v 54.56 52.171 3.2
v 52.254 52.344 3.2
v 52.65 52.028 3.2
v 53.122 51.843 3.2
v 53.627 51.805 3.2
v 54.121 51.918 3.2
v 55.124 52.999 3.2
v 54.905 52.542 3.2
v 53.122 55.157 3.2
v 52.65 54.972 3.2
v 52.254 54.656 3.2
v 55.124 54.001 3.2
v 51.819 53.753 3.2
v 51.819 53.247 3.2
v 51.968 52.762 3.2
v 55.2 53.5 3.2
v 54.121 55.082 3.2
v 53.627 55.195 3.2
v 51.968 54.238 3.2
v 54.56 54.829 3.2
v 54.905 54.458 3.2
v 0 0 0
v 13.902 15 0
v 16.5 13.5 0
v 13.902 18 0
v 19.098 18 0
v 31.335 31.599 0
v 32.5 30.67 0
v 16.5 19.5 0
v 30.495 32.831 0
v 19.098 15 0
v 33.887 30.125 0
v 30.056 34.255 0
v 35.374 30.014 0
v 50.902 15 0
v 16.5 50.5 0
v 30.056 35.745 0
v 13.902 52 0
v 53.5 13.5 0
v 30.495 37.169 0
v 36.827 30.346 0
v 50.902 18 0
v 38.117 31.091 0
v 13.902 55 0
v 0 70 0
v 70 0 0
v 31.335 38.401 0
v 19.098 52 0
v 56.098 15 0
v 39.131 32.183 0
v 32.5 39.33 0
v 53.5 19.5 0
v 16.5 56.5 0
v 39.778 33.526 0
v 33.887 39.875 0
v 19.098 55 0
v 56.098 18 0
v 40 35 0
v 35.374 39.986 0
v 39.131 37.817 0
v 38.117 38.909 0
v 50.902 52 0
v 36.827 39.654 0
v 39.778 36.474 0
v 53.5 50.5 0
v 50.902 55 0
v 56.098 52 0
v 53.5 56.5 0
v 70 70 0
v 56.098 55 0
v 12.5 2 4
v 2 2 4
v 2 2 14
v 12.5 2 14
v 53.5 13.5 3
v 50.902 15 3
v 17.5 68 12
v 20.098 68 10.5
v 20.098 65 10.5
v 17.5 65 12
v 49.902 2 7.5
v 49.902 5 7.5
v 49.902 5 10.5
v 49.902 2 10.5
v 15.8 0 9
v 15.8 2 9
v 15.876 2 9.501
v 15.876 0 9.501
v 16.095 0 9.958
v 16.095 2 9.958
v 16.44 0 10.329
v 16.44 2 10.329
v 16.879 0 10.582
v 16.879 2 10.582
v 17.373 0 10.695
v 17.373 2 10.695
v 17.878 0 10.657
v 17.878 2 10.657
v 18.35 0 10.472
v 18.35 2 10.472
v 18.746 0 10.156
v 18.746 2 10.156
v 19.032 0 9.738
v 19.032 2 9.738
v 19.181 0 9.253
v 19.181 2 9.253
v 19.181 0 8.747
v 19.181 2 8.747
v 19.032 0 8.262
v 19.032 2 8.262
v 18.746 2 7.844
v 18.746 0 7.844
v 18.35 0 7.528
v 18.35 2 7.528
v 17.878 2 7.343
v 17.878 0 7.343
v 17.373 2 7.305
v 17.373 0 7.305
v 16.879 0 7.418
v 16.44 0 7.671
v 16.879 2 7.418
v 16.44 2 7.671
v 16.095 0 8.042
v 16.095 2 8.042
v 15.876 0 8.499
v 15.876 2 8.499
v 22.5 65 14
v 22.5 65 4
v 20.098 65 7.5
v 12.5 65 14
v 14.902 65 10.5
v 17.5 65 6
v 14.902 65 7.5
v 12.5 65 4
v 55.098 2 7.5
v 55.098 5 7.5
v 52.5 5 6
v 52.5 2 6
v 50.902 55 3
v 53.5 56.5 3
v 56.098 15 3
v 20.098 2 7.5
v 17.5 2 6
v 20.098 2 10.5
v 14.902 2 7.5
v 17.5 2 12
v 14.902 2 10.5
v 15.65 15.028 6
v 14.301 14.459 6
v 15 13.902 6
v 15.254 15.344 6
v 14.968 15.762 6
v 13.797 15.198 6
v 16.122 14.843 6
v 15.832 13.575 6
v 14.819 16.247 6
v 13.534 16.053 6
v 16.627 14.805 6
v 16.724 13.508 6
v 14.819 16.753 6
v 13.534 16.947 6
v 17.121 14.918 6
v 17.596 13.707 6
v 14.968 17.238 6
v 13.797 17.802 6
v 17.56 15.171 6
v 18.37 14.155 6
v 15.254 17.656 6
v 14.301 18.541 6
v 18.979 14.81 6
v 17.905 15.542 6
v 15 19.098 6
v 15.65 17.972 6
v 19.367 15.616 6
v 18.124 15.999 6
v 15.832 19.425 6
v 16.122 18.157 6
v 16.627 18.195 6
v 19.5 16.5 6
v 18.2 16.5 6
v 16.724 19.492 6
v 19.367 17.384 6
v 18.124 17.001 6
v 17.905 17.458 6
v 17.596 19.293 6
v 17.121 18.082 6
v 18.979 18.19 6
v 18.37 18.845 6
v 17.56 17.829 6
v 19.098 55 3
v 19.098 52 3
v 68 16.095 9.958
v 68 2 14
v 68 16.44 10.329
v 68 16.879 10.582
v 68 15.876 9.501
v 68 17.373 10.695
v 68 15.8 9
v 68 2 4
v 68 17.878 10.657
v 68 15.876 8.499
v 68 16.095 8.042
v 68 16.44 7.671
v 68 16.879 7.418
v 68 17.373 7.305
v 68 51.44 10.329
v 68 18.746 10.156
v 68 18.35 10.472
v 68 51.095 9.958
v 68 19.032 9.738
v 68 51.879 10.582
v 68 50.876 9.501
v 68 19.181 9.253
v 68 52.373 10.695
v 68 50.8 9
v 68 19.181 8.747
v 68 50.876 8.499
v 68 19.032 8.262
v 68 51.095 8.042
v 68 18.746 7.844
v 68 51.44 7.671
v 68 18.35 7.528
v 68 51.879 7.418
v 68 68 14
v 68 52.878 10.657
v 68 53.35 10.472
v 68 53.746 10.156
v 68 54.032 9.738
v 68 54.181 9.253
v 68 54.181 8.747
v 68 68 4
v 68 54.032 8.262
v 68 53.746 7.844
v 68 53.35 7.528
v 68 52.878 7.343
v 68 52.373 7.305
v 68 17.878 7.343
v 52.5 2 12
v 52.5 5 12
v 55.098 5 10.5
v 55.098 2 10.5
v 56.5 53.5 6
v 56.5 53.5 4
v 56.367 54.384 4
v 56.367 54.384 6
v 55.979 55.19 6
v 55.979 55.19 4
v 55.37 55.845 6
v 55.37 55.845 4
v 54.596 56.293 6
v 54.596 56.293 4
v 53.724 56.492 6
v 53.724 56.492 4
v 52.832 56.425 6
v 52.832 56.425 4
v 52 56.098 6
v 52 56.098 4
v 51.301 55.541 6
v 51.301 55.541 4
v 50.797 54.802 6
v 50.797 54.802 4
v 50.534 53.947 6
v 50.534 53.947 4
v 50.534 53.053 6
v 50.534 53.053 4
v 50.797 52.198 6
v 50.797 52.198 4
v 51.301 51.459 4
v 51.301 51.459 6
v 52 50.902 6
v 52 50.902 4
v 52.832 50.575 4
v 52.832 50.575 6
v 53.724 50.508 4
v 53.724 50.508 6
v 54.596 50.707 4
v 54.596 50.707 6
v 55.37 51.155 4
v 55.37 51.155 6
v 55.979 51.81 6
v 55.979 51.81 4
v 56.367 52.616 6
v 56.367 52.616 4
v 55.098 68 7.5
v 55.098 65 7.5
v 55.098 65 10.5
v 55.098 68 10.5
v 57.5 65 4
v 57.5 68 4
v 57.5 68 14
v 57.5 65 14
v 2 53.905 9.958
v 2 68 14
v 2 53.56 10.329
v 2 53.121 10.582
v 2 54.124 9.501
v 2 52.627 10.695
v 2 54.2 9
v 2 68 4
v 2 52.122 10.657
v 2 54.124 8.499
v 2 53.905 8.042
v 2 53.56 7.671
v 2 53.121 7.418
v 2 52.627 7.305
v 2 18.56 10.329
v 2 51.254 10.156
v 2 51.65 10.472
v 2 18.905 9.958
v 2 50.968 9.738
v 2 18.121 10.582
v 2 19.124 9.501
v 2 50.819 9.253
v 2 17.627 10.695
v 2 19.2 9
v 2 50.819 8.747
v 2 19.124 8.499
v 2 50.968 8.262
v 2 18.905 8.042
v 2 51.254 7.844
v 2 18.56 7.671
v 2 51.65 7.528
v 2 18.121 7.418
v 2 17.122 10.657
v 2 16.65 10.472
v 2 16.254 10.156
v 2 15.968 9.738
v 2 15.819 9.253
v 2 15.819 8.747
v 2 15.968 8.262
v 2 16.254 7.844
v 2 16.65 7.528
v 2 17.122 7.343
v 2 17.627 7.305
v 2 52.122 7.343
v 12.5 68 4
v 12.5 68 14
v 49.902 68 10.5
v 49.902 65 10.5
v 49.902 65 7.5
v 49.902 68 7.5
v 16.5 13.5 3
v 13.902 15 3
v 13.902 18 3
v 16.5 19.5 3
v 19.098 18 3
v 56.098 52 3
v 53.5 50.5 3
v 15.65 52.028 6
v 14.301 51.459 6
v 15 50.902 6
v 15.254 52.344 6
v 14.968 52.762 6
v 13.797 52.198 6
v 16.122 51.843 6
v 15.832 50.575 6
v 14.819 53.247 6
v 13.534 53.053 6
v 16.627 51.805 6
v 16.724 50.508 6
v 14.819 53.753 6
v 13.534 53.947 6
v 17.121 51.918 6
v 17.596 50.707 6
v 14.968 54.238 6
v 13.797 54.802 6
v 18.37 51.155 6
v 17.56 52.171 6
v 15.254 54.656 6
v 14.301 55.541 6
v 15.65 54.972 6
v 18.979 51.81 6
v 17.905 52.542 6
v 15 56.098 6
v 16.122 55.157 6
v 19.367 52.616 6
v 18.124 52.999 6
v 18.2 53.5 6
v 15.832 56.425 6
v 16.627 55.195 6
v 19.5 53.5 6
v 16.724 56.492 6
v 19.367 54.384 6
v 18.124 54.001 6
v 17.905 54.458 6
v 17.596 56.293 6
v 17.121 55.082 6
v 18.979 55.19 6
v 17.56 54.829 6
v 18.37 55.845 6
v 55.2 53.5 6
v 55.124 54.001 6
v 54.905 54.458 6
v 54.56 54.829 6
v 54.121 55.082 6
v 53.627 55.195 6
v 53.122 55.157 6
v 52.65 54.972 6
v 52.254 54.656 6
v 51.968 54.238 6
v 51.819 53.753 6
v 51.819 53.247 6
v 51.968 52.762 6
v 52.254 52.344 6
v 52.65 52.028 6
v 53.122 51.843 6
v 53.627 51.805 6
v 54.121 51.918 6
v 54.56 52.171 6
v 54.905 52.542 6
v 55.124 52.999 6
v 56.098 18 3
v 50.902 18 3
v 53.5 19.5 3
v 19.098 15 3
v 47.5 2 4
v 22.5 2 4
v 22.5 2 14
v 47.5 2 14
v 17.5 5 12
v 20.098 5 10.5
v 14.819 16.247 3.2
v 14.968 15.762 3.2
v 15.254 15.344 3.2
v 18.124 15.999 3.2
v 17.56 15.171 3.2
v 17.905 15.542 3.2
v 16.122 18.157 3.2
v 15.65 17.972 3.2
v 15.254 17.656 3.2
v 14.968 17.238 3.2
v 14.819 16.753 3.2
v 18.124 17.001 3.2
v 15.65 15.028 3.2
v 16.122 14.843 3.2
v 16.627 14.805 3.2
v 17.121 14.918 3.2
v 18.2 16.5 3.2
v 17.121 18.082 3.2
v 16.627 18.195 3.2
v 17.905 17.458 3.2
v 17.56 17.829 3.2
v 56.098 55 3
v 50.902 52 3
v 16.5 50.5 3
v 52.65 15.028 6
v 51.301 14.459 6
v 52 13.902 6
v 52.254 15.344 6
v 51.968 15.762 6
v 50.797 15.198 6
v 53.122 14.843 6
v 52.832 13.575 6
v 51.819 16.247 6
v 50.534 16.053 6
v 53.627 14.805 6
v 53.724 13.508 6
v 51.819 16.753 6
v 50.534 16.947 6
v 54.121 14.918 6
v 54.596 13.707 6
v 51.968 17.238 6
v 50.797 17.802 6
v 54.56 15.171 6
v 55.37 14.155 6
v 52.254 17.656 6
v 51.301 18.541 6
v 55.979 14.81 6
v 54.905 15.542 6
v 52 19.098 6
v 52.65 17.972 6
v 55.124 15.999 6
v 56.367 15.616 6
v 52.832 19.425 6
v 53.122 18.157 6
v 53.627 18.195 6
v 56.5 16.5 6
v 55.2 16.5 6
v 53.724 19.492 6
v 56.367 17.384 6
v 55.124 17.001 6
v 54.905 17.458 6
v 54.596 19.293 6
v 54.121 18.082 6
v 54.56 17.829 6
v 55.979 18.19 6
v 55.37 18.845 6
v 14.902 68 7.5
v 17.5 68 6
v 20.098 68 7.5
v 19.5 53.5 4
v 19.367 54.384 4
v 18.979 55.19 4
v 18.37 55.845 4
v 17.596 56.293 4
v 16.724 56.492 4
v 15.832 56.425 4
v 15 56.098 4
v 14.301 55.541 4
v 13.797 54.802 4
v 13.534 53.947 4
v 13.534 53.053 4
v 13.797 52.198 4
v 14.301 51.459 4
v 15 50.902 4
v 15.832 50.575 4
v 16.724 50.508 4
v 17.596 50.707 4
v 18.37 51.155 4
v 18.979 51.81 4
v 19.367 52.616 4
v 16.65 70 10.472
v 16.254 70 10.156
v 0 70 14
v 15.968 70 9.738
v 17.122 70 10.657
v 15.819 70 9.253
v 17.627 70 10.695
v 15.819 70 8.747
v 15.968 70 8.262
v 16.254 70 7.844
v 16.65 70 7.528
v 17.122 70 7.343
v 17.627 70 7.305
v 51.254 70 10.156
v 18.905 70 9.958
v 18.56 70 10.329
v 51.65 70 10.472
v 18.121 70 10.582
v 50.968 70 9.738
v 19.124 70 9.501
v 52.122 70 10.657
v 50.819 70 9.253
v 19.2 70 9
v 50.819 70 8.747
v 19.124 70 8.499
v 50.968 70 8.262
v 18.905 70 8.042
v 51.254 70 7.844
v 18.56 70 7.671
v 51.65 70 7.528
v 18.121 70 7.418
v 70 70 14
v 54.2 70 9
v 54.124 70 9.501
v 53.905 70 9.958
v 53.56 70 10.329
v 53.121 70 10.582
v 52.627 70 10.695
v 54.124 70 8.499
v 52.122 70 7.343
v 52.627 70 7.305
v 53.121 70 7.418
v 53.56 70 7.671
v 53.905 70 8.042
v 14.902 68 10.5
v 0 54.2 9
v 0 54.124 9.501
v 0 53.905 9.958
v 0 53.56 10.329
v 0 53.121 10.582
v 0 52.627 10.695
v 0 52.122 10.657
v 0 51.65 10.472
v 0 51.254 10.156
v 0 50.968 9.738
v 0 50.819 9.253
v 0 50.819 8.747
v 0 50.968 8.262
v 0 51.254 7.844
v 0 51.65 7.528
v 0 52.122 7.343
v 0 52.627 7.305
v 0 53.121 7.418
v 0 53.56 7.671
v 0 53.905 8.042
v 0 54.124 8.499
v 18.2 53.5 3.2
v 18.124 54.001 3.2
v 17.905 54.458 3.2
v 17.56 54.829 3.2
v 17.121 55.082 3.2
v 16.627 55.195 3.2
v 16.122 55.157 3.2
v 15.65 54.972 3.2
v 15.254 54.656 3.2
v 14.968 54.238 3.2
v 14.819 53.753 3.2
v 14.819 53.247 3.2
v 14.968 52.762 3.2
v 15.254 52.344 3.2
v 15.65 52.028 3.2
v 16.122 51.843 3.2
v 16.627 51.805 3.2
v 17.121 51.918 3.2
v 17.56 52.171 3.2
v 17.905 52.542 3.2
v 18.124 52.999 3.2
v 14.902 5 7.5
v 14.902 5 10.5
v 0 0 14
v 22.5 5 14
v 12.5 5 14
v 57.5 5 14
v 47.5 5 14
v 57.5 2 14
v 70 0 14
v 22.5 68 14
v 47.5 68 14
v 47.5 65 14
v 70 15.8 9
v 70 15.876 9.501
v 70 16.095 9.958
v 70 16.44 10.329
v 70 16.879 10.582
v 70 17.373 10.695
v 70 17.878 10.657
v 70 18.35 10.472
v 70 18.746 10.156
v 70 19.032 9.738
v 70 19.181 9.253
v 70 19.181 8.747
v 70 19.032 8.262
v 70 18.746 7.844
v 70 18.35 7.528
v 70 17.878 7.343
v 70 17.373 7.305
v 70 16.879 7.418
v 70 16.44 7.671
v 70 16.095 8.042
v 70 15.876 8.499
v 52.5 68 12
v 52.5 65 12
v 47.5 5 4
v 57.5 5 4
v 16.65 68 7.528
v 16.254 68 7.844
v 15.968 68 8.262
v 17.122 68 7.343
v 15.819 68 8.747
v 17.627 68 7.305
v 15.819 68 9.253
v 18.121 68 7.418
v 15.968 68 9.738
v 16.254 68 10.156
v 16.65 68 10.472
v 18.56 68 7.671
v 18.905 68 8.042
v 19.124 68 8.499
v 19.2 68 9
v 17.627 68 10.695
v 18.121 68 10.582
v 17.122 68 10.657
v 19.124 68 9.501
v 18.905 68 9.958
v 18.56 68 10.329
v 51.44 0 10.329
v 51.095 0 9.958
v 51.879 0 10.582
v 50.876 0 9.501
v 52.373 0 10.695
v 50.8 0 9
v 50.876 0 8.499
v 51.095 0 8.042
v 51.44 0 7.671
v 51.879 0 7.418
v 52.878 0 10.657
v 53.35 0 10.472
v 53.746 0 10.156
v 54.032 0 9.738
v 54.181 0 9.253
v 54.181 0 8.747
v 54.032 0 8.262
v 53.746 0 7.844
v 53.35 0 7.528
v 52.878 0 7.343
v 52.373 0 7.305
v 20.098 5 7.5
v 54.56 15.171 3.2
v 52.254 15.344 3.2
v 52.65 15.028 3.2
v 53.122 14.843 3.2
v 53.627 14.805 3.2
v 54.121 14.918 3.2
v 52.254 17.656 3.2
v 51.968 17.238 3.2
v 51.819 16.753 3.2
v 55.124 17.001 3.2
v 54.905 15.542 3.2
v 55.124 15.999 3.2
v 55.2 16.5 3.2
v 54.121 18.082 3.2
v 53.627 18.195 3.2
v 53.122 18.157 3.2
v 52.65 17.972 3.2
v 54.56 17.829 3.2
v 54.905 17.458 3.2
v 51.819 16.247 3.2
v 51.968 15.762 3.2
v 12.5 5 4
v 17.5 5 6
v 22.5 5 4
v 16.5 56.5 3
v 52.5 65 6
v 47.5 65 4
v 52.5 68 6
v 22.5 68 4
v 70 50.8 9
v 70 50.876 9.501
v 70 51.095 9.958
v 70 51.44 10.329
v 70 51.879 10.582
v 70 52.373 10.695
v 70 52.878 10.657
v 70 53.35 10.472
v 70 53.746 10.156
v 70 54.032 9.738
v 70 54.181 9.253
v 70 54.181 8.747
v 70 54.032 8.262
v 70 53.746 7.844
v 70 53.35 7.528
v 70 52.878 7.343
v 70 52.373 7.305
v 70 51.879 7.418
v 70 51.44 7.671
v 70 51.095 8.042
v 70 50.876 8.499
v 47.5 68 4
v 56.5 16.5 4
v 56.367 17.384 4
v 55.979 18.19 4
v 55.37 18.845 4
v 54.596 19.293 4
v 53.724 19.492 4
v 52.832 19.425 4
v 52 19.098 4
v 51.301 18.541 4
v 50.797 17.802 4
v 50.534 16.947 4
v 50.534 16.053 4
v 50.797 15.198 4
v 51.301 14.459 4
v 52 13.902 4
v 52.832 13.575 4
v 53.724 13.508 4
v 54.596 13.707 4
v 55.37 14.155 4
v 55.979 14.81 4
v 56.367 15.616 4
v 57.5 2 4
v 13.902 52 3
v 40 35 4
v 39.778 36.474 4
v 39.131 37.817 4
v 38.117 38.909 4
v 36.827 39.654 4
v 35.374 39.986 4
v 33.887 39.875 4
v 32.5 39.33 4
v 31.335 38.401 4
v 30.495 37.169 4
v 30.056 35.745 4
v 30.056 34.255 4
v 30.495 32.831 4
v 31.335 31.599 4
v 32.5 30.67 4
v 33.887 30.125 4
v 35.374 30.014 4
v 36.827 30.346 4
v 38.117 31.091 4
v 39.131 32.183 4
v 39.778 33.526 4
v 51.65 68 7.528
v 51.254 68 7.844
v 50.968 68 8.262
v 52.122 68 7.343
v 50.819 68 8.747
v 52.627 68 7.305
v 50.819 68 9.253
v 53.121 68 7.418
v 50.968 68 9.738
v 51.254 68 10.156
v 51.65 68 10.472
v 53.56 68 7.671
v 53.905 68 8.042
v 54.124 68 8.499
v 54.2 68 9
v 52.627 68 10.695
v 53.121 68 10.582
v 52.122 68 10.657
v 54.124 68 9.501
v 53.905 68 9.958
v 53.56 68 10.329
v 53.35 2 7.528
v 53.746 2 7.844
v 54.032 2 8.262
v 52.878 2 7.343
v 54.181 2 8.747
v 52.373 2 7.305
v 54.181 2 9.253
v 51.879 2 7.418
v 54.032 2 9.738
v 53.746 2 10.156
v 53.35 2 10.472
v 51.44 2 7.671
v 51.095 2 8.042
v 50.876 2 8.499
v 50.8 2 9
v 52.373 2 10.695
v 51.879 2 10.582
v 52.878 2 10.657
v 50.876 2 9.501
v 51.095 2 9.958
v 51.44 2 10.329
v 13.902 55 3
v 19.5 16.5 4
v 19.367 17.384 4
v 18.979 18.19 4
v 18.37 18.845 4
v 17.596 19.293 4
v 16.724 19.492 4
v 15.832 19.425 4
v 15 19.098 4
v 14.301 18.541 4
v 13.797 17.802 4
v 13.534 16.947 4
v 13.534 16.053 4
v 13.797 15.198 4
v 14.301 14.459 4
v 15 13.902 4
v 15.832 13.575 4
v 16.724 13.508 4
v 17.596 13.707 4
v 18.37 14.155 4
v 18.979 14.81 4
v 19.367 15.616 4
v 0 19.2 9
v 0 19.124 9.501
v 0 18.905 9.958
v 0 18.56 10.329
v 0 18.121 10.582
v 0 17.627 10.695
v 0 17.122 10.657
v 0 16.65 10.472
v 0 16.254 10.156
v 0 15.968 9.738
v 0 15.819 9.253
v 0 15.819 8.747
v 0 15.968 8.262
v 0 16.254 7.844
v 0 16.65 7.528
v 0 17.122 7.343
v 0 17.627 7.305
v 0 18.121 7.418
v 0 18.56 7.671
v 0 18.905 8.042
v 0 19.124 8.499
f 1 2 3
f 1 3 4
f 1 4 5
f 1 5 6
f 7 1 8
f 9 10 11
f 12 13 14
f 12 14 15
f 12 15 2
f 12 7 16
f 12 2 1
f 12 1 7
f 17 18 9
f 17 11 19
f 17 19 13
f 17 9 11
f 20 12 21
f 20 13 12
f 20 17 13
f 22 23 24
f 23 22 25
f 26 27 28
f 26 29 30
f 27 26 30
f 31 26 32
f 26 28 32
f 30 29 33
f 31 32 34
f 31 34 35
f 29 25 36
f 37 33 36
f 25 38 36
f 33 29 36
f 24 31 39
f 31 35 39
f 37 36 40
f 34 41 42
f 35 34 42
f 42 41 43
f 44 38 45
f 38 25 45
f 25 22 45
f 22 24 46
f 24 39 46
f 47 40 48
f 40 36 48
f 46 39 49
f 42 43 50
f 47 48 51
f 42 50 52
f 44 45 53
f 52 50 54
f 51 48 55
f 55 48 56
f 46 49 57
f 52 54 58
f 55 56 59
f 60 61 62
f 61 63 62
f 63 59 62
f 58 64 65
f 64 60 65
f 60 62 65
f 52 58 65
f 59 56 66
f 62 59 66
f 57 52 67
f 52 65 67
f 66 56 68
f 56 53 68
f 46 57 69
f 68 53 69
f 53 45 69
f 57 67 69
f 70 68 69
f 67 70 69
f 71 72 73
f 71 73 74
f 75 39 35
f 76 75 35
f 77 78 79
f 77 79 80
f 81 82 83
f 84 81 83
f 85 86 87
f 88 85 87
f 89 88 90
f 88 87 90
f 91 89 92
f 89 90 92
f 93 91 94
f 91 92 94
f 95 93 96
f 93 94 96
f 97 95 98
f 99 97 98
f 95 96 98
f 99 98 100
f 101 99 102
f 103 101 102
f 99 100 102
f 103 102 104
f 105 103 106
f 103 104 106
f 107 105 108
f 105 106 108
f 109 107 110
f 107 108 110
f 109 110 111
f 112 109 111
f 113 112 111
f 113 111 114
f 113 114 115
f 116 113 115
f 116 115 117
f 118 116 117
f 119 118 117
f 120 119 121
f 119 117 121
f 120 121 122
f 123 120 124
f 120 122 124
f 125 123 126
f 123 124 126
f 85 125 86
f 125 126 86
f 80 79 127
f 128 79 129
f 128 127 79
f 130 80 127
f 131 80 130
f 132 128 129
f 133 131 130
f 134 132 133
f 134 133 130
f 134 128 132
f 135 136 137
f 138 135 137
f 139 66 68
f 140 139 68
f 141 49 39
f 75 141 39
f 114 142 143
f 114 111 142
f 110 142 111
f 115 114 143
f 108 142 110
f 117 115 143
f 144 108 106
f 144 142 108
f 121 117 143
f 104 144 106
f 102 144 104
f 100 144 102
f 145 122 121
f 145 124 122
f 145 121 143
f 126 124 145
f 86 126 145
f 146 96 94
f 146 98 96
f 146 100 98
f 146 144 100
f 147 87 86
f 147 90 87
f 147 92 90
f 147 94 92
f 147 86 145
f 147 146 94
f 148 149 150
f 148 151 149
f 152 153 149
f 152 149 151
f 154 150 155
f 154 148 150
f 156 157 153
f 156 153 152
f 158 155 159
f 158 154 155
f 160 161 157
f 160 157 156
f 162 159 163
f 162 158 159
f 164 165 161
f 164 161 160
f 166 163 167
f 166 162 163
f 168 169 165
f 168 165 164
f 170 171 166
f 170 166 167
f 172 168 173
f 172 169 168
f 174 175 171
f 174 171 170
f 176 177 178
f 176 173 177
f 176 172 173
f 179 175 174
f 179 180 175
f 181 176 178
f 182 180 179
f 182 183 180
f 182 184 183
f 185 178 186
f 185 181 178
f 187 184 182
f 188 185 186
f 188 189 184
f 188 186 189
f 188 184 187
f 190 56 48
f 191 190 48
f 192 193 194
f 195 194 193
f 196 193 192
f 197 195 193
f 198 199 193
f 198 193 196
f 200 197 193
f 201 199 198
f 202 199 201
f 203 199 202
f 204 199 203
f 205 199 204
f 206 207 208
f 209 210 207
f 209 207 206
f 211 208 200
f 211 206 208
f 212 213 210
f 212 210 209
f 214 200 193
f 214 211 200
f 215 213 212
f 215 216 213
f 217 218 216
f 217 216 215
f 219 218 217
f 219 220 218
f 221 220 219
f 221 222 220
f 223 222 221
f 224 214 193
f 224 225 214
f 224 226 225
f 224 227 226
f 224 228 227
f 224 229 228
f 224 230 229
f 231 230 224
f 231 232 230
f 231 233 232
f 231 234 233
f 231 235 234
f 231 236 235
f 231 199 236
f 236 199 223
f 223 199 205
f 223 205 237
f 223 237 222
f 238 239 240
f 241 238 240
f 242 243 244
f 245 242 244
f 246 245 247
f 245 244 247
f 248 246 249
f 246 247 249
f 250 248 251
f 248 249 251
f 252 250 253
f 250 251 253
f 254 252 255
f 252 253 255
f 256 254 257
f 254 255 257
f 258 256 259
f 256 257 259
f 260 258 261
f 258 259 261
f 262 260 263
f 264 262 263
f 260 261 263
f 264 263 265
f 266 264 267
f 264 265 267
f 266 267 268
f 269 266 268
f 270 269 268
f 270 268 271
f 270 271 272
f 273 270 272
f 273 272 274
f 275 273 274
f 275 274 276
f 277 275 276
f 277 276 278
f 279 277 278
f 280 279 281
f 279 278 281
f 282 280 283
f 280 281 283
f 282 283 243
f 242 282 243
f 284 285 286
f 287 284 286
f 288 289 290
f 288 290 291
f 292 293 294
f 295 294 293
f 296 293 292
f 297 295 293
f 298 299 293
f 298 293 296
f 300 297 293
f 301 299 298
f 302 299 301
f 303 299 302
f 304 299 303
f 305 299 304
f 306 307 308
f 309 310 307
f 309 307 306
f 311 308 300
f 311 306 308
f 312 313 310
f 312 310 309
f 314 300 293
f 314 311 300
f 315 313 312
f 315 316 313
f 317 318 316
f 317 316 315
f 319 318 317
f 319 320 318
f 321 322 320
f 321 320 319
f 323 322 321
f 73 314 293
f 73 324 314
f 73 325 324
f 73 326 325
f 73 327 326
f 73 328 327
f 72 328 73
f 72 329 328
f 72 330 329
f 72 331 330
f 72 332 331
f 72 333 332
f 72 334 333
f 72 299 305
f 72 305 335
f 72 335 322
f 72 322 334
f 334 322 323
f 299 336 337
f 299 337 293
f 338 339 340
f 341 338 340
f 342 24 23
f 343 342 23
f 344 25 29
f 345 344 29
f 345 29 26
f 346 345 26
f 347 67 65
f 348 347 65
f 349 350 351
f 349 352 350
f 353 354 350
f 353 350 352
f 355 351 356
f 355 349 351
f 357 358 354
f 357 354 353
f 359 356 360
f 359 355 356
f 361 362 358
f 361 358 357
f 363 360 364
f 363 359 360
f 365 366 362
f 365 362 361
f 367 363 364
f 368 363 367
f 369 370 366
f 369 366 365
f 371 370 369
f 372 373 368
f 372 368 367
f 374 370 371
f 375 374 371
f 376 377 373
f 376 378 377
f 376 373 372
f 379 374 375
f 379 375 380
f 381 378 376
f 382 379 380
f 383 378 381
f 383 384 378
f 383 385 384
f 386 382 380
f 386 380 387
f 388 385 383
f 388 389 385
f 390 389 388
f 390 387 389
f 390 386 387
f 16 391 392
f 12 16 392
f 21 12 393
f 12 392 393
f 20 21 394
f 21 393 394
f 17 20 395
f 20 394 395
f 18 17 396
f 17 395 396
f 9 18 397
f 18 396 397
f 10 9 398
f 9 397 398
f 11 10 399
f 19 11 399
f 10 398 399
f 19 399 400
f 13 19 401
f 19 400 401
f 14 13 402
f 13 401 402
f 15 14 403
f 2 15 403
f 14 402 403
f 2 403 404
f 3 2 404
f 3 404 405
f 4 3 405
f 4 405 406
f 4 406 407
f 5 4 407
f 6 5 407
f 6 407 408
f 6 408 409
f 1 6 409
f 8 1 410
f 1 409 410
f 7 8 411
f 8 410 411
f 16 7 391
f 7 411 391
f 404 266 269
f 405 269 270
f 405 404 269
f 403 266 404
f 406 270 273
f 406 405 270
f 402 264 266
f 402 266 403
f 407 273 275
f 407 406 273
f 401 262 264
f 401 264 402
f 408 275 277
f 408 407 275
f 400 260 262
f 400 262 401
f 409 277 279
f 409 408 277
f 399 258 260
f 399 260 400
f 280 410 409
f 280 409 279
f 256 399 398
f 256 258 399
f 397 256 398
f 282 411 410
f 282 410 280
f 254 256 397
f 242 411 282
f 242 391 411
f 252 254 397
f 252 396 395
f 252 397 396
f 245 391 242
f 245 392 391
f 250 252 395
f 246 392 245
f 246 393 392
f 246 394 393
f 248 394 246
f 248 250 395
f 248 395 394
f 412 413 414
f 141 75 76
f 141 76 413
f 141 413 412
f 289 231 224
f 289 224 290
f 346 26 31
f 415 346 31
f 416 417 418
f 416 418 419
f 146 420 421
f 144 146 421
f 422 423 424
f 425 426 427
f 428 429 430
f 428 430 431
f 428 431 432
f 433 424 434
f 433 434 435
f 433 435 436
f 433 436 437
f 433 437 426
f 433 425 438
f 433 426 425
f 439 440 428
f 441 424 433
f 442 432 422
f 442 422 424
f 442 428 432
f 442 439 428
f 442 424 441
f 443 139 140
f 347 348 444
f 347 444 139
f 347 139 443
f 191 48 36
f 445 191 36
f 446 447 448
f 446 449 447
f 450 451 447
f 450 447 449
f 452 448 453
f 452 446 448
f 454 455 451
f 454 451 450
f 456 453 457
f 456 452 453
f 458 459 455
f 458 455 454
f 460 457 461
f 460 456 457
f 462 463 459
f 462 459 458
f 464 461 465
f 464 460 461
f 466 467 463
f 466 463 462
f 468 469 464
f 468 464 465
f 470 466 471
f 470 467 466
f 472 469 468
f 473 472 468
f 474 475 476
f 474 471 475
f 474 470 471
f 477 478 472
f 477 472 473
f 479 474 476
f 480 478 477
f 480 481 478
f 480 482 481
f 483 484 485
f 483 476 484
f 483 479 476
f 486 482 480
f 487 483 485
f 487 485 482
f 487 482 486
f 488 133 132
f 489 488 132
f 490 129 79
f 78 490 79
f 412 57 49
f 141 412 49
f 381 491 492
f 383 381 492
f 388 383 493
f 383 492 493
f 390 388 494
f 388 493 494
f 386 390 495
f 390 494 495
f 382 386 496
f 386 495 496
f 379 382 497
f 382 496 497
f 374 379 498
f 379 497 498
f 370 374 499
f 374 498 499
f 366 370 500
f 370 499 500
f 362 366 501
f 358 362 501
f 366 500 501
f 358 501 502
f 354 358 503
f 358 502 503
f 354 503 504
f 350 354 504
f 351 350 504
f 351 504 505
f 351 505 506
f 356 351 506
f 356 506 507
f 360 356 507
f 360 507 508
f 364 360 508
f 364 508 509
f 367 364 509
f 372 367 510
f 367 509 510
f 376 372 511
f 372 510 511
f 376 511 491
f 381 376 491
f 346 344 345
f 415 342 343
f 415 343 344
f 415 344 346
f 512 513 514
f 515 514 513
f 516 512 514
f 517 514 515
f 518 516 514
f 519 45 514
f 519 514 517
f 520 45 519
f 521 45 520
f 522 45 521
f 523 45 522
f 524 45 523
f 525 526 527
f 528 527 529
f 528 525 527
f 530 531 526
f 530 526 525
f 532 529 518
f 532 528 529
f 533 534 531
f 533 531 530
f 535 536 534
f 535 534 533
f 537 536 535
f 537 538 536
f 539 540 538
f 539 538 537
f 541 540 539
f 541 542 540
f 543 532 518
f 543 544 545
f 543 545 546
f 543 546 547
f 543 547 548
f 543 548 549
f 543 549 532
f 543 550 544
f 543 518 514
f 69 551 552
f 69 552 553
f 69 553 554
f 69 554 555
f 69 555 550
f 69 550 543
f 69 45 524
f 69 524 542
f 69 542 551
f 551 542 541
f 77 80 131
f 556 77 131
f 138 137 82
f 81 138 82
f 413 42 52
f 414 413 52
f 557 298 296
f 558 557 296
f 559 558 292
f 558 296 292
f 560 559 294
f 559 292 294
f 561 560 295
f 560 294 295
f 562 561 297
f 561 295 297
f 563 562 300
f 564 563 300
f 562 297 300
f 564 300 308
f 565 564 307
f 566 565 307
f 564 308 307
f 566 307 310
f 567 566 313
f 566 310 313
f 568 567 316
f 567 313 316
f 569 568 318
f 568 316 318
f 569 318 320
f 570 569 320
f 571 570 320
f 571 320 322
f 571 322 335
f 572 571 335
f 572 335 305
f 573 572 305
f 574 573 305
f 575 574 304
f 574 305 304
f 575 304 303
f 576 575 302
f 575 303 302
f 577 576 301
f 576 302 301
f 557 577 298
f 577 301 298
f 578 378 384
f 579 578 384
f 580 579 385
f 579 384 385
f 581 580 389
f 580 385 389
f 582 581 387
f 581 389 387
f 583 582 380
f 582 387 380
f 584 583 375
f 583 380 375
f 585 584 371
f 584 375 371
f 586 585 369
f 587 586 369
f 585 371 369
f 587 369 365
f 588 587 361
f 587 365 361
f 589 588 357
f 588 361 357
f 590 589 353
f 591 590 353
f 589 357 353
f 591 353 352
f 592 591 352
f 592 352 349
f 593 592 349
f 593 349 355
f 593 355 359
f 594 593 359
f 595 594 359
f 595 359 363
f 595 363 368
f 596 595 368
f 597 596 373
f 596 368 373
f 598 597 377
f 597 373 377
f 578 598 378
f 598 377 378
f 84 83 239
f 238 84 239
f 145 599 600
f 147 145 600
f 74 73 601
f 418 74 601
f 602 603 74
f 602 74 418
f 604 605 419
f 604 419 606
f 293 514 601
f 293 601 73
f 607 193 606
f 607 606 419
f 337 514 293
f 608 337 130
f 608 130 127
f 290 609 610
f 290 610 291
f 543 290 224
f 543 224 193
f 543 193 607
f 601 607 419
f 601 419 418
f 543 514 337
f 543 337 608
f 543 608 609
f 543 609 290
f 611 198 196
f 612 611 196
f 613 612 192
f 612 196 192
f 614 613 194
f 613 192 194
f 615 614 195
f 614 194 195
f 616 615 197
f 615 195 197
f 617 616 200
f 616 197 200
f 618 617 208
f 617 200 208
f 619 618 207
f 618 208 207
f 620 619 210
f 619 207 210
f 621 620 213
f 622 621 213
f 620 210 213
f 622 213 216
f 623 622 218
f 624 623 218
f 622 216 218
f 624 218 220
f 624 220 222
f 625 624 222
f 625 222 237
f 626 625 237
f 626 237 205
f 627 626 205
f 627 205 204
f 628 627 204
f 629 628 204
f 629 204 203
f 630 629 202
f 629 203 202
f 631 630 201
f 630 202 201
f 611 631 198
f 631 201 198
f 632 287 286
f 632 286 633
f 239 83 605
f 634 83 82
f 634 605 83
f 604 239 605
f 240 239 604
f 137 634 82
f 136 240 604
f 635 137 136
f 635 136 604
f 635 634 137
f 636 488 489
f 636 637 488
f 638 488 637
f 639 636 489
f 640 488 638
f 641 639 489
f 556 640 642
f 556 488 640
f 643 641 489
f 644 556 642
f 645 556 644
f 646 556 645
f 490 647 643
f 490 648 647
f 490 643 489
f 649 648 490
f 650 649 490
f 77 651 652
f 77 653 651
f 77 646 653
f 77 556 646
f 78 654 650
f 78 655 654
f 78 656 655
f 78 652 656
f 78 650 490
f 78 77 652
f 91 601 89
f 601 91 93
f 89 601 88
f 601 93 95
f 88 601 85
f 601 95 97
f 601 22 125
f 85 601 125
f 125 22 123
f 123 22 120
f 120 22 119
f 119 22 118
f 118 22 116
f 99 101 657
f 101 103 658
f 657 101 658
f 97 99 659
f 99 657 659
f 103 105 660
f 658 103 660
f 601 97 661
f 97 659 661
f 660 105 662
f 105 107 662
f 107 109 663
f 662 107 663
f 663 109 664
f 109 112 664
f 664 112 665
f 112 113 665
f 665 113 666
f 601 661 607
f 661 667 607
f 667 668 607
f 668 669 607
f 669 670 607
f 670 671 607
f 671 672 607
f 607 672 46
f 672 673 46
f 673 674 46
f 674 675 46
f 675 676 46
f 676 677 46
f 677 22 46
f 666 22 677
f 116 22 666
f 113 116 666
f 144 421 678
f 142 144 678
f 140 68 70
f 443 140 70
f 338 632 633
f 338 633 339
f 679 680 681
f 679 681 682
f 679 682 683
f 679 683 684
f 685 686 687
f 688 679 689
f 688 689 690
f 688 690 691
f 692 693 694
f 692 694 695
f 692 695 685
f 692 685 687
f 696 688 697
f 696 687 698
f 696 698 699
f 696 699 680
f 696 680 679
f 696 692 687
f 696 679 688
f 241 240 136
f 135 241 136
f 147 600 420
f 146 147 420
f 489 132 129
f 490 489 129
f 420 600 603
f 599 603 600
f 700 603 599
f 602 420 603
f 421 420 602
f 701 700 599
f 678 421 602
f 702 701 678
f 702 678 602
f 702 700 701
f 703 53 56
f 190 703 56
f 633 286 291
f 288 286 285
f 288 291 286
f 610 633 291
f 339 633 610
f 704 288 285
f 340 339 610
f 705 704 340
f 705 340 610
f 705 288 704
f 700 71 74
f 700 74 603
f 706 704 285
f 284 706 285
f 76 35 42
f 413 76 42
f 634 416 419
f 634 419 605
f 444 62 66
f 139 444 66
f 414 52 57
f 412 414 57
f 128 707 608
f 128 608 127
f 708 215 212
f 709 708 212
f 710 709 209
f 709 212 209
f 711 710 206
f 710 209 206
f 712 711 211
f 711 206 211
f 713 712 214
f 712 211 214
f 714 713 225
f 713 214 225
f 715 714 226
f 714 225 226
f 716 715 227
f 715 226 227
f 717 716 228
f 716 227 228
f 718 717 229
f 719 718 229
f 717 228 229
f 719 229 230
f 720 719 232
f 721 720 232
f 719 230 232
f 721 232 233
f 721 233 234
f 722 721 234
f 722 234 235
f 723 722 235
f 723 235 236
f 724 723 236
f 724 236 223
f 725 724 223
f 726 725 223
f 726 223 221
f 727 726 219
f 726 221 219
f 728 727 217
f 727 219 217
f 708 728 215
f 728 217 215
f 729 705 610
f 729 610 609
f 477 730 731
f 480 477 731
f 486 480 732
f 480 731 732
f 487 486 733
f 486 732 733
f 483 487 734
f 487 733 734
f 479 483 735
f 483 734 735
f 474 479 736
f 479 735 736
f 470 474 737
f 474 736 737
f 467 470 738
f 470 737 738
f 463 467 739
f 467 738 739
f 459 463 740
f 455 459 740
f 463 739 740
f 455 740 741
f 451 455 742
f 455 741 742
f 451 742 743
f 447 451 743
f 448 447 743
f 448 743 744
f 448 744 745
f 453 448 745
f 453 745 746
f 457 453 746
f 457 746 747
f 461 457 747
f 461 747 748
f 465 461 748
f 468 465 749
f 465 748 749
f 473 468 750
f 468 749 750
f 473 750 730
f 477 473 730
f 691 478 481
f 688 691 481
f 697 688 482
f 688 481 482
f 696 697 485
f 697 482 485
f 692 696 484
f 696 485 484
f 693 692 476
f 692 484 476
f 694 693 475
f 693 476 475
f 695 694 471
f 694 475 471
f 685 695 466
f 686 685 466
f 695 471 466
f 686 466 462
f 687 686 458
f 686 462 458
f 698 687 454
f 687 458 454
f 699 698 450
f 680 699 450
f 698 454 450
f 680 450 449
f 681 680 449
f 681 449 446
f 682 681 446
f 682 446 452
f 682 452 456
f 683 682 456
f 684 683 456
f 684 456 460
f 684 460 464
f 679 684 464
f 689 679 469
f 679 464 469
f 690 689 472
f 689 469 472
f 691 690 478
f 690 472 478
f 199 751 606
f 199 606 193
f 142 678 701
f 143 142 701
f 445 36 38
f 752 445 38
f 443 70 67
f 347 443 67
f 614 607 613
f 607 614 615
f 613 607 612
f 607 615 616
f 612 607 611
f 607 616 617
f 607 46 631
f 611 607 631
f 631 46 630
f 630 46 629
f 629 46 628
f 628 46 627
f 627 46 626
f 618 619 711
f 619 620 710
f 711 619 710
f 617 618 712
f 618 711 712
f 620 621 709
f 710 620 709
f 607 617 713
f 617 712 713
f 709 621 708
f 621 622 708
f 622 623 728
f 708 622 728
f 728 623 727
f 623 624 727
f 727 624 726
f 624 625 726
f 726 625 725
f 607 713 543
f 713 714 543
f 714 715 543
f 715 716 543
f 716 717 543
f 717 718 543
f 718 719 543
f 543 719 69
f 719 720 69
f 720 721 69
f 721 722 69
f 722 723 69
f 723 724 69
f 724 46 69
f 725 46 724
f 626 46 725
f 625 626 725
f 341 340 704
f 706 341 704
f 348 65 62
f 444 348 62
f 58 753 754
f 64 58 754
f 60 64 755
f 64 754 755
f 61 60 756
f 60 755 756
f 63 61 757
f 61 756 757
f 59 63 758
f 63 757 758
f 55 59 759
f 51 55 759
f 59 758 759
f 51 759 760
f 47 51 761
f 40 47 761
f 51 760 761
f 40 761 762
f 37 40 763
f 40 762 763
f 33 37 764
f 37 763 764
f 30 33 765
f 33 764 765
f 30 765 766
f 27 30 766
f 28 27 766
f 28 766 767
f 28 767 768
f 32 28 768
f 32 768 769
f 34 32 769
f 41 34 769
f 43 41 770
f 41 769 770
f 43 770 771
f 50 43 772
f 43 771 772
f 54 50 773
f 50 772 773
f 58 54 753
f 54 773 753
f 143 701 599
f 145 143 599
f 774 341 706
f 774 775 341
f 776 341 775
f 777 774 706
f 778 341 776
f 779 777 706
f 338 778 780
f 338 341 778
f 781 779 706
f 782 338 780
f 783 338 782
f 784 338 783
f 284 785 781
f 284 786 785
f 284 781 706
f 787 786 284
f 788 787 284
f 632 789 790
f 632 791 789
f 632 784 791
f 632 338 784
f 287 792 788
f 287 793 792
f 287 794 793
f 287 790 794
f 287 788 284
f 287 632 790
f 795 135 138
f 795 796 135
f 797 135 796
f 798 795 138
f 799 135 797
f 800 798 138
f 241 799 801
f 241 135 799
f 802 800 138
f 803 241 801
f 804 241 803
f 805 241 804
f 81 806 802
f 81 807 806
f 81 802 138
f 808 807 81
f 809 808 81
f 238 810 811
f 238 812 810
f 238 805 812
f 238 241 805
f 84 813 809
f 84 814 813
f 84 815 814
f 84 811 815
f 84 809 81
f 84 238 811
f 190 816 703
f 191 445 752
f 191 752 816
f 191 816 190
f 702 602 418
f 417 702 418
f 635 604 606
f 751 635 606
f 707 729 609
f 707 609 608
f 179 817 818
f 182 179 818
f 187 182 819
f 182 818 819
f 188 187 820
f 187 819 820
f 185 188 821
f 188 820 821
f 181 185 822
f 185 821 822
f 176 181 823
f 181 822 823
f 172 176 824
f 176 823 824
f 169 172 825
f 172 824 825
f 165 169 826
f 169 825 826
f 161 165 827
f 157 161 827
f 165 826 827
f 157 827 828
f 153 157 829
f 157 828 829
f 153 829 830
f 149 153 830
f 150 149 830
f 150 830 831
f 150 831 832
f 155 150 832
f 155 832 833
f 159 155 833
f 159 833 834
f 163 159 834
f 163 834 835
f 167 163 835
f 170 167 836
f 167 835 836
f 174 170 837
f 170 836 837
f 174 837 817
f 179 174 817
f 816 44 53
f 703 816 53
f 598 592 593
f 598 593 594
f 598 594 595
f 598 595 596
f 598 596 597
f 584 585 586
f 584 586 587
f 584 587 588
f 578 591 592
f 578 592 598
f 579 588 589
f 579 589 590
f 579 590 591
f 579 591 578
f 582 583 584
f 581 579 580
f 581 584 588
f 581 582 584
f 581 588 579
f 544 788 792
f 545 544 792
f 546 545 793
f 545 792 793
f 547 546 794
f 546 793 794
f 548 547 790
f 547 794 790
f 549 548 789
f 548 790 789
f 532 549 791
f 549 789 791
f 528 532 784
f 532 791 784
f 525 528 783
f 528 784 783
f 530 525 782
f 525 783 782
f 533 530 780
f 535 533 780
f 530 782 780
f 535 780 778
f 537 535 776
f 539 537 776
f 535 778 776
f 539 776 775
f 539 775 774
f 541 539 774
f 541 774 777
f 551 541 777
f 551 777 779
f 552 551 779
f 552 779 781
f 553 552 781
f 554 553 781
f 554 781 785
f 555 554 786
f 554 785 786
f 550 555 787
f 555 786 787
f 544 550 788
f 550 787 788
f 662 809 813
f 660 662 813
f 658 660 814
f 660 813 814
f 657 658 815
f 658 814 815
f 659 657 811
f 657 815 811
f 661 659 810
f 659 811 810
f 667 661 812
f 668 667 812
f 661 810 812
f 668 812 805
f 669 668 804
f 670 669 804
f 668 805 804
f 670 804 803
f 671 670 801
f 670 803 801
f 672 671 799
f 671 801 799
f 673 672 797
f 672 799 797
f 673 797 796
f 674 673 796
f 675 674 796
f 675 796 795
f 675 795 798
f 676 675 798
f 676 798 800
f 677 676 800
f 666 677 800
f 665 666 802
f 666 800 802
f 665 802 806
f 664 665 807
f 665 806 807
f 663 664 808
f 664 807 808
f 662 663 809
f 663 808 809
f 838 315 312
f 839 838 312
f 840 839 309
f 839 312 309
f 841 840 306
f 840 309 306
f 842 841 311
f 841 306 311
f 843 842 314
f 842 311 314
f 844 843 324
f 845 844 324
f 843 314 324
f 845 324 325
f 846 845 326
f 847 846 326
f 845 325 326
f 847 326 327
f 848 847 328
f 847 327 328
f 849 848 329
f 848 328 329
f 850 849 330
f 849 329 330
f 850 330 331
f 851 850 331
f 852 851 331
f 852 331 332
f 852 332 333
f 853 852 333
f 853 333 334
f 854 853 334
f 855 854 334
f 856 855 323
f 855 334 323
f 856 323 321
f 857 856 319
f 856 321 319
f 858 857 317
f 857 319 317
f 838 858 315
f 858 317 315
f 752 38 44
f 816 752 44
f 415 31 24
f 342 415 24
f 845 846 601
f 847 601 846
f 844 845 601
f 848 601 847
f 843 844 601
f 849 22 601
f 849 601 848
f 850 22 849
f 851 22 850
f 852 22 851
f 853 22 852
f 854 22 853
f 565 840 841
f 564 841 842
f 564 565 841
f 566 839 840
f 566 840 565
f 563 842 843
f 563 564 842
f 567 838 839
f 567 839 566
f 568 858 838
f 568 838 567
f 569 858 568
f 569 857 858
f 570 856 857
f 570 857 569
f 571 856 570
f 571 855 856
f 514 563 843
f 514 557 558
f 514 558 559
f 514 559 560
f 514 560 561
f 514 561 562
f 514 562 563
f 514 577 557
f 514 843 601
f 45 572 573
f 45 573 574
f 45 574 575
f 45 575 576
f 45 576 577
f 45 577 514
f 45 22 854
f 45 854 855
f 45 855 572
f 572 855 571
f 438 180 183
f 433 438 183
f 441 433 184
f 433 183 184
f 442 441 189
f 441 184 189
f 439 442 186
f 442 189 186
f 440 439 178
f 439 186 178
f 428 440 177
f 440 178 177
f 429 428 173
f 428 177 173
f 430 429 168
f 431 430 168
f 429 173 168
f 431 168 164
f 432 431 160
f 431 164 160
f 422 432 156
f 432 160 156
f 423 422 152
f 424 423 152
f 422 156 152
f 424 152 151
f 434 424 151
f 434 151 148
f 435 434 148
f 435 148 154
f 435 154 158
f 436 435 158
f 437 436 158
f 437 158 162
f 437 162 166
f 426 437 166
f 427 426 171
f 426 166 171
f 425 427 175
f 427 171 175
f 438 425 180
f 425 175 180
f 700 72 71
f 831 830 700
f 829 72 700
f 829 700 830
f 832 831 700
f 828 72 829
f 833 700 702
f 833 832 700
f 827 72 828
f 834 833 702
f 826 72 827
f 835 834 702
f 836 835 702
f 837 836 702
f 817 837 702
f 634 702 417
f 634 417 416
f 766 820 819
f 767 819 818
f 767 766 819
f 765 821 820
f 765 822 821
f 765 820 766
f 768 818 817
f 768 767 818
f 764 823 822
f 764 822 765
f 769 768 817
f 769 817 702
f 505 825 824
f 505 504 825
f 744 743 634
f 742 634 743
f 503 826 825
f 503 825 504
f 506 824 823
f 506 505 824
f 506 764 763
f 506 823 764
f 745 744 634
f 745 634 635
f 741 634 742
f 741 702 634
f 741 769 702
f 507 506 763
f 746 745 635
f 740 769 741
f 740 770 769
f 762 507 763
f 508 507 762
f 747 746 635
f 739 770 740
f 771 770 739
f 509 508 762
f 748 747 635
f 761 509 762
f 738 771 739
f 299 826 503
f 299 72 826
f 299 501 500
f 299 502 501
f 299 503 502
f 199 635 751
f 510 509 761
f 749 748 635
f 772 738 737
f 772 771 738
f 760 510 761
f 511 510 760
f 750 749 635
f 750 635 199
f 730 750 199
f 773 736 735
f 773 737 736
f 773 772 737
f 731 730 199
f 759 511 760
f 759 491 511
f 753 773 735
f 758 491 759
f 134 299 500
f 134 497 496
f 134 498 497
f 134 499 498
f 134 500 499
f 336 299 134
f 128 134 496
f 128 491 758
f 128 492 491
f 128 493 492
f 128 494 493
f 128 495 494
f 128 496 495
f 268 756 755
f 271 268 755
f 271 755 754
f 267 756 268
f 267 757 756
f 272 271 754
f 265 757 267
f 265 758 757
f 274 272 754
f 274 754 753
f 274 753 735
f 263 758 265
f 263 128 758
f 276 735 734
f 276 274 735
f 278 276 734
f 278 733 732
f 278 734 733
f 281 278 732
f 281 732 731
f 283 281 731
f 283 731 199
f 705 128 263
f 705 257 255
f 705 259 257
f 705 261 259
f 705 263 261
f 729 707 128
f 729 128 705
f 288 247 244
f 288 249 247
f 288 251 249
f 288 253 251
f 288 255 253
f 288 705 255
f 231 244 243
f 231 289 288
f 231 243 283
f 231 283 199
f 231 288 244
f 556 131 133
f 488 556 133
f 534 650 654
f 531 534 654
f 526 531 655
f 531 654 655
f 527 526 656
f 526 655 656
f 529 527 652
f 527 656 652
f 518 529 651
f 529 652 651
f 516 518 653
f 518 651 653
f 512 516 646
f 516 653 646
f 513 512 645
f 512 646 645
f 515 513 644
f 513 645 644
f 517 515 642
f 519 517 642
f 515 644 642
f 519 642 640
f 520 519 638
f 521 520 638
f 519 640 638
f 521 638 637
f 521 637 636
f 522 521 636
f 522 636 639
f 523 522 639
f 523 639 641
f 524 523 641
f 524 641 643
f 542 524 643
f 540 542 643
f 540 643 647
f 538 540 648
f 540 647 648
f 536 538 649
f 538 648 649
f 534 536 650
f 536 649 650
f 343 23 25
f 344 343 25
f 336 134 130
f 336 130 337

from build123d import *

# Parameters (mm, degrees)
SKETCH_W        = 70
SKETCH_H        = 70
PAD_DEPTH       = 4
SKETCH001_W     = 70
SKETCH001_H     = 70
PAD001_DEPTH    = 10
SKETCH002_R     = 1.7
POCKET_DEPTH    = 2
SKETCH003_R     = 1.7
POCKET001_DEPTH = 2
POCKET002_DEPTH = 3
SKETCH005_R     = 1.7
POCKET003_DEPTH = 2
POCKET004_DEPTH = 3
SKETCH007_R     = 1.7
POCKET005_DEPTH = 2
POCKET006_DEPTH = 3
SKETCH009_R     = 3
PAD002_DEPTH    = 2
SKETCH010_R     = 1.7
POCKET007_DEPTH = 2.8
SKETCH011_R     = 5
POCKET008_DEPTH = 4


with BuildPart() as part:
    # Sketch → Pad (new body)
    with BuildSketch(Plane.XY):
        with Locations((35, 35)):
            Rectangle(SKETCH_W, SKETCH_H)
    extrude(amount=PAD_DEPTH)

    # Sketch001 → Pad001 (new body)
    with BuildSketch(Plane.XY.offset(4)):
        with Locations((35, 35)):
            Rectangle(SKETCH001_W, SKETCH001_H)
        Polygon((2, 68), (2, 2), (12.5, 2), (12.5, 5), (22.5, 5), (22.5, 2), (47.5, 2), (47.5, 5), (57.5, 5), (57.5, 2), (68, 2), (68, 68), (57.5, 68), (57.5, 65), (47.5, 65), (47.5, 68), (22.5, 68), (22.5, 65), (12.5, 65), (12.5, 68), align=None, mode=Mode.SUBTRACT)
    extrude(amount=PAD001_DEPTH)

    # Sketch002 → Pocket (cut)
    with BuildSketch(Plane.YZ.offset(2)):
        with Locations((17.5, 9)):
            Circle(SKETCH002_R)
        with Locations((52.5, 9)):
            Circle(SKETCH002_R)
    extrude(amount=-POCKET_DEPTH, mode=Mode.SUBTRACT)

    # Sketch003 → Pocket001 (cut)
    with BuildSketch(Plane(origin=(68, 0, 0), x_dir=(0, -1, 0), z_dir=(-1, 0, 0))):
        with Locations((-52.5, 9)):
            Circle(SKETCH003_R)
        with Locations((-17.5, 9)):
            Circle(SKETCH003_R)
    extrude(amount=-POCKET001_DEPTH, mode=Mode.SUBTRACT)

    # Sketch004 → Pocket002 (cut)
    with BuildSketch(Plane(origin=(0, 5, 0), x_dir=(-1, 0, 0), z_dir=(0, 1, 0))):
        Polygon((-49.901924, 10.5), (-52.5, 12), (-55.098076, 10.5), (-55.098076, 7.5), (-52.5, 6), (-49.901924, 7.5), align=None)
        Polygon((-14.901924, 10.5), (-17.5, 12), (-20.098076, 10.5), (-20.098076, 7.5), (-17.5, 6), (-14.901924, 7.5), align=None)
    extrude(amount=-POCKET002_DEPTH, mode=Mode.SUBTRACT)

    # Sketch005 → Pocket003 (cut)
    with BuildSketch(Plane(origin=(0, 2, 0), x_dir=(-1, 0, 0), z_dir=(0, 1, 0))):
        with Locations((-52.5, 9)):
            Circle(SKETCH005_R)
        with Locations((-17.5, 9)):
            Circle(SKETCH005_R)
    extrude(amount=-POCKET003_DEPTH, mode=Mode.SUBTRACT)

    # Sketch006 → Pocket004 (cut)
    with BuildSketch(Plane.XZ.offset(-65)):
        Polygon((20.098076, 10.5), (17.5, 12), (14.901924, 10.5), (14.901924, 7.5), (17.5, 6), (20.098076, 7.5), align=None)
        Polygon((55.098076, 10.5), (52.5, 12), (49.901924, 10.5), (49.901924, 7.5), (52.5, 6), (55.098076, 7.5), align=None)
    extrude(amount=-POCKET004_DEPTH, mode=Mode.SUBTRACT)

    # Sketch007 → Pocket005 (cut)
    with BuildSketch(Plane.XZ.offset(-68)):
        with Locations((17.5, 9)):
            Circle(SKETCH007_R)
        with Locations((52.5, 9)):
            Circle(SKETCH007_R)
    extrude(amount=-POCKET005_DEPTH, mode=Mode.SUBTRACT)

    # Sketch008 → Pocket006 (cut)
    with BuildSketch(Plane(origin=(0, 0, 0), x_dir=(1, 0, 0), z_dir=(0, 0, -1))):
        Polygon((19.098076, -15), (16.5, -13.5), (13.901924, -15), (13.901924, -18), (16.5, -19.5), (19.098076, -18), align=None)
        Polygon((56.098076, -15), (53.5, -13.5), (50.901924, -15), (50.901924, -18), (53.5, -19.5), (56.098076, -18), align=None)
        Polygon((56.098076, -55), (56.098076, -52), (53.5, -50.5), (50.901924, -52), (50.901924, -55), (53.5, -56.5), align=None)
        Polygon((19.098076, -52), (16.5, -50.5), (13.901924, -52), (13.901924, -55), (16.5, -56.5), (19.098076, -55), align=None)
    extrude(amount=-POCKET006_DEPTH, mode=Mode.SUBTRACT)

    # Sketch009 → Pad002 (new body)
    with BuildSketch(Plane.XY.offset(4)):
        with Locations((16.5, 53.5)):
            Circle(SKETCH009_R)
        with Locations((53.5, 53.5)):
            Circle(SKETCH009_R)
        with Locations((53.5, 16.5)):
            Circle(SKETCH009_R)
        with Locations((16.5, 16.5)):
            Circle(SKETCH009_R)
    extrude(amount=PAD002_DEPTH)

    # Sketch010 → Pocket007 (cut)
    with BuildSketch(Plane.XY.offset(6)):
        with Locations((16.5, 53.5)):
            Circle(SKETCH010_R)
        with Locations((53.5, 53.5)):
            Circle(SKETCH010_R)
        with Locations((53.5, 16.5)):
            Circle(SKETCH010_R)
        with Locations((16.5, 16.5)):
            Circle(SKETCH010_R)
    extrude(amount=-POCKET007_DEPTH, mode=Mode.SUBTRACT)

    # Sketch011 → Pocket008 (cut)
    with BuildSketch(Plane.XY.offset(4)):
        with Locations((35, 35)):
            Circle(SKETCH011_R)
    extrude(amount=-POCKET008_DEPTH, mode=Mode.SUBTRACT)


solid = part.part
